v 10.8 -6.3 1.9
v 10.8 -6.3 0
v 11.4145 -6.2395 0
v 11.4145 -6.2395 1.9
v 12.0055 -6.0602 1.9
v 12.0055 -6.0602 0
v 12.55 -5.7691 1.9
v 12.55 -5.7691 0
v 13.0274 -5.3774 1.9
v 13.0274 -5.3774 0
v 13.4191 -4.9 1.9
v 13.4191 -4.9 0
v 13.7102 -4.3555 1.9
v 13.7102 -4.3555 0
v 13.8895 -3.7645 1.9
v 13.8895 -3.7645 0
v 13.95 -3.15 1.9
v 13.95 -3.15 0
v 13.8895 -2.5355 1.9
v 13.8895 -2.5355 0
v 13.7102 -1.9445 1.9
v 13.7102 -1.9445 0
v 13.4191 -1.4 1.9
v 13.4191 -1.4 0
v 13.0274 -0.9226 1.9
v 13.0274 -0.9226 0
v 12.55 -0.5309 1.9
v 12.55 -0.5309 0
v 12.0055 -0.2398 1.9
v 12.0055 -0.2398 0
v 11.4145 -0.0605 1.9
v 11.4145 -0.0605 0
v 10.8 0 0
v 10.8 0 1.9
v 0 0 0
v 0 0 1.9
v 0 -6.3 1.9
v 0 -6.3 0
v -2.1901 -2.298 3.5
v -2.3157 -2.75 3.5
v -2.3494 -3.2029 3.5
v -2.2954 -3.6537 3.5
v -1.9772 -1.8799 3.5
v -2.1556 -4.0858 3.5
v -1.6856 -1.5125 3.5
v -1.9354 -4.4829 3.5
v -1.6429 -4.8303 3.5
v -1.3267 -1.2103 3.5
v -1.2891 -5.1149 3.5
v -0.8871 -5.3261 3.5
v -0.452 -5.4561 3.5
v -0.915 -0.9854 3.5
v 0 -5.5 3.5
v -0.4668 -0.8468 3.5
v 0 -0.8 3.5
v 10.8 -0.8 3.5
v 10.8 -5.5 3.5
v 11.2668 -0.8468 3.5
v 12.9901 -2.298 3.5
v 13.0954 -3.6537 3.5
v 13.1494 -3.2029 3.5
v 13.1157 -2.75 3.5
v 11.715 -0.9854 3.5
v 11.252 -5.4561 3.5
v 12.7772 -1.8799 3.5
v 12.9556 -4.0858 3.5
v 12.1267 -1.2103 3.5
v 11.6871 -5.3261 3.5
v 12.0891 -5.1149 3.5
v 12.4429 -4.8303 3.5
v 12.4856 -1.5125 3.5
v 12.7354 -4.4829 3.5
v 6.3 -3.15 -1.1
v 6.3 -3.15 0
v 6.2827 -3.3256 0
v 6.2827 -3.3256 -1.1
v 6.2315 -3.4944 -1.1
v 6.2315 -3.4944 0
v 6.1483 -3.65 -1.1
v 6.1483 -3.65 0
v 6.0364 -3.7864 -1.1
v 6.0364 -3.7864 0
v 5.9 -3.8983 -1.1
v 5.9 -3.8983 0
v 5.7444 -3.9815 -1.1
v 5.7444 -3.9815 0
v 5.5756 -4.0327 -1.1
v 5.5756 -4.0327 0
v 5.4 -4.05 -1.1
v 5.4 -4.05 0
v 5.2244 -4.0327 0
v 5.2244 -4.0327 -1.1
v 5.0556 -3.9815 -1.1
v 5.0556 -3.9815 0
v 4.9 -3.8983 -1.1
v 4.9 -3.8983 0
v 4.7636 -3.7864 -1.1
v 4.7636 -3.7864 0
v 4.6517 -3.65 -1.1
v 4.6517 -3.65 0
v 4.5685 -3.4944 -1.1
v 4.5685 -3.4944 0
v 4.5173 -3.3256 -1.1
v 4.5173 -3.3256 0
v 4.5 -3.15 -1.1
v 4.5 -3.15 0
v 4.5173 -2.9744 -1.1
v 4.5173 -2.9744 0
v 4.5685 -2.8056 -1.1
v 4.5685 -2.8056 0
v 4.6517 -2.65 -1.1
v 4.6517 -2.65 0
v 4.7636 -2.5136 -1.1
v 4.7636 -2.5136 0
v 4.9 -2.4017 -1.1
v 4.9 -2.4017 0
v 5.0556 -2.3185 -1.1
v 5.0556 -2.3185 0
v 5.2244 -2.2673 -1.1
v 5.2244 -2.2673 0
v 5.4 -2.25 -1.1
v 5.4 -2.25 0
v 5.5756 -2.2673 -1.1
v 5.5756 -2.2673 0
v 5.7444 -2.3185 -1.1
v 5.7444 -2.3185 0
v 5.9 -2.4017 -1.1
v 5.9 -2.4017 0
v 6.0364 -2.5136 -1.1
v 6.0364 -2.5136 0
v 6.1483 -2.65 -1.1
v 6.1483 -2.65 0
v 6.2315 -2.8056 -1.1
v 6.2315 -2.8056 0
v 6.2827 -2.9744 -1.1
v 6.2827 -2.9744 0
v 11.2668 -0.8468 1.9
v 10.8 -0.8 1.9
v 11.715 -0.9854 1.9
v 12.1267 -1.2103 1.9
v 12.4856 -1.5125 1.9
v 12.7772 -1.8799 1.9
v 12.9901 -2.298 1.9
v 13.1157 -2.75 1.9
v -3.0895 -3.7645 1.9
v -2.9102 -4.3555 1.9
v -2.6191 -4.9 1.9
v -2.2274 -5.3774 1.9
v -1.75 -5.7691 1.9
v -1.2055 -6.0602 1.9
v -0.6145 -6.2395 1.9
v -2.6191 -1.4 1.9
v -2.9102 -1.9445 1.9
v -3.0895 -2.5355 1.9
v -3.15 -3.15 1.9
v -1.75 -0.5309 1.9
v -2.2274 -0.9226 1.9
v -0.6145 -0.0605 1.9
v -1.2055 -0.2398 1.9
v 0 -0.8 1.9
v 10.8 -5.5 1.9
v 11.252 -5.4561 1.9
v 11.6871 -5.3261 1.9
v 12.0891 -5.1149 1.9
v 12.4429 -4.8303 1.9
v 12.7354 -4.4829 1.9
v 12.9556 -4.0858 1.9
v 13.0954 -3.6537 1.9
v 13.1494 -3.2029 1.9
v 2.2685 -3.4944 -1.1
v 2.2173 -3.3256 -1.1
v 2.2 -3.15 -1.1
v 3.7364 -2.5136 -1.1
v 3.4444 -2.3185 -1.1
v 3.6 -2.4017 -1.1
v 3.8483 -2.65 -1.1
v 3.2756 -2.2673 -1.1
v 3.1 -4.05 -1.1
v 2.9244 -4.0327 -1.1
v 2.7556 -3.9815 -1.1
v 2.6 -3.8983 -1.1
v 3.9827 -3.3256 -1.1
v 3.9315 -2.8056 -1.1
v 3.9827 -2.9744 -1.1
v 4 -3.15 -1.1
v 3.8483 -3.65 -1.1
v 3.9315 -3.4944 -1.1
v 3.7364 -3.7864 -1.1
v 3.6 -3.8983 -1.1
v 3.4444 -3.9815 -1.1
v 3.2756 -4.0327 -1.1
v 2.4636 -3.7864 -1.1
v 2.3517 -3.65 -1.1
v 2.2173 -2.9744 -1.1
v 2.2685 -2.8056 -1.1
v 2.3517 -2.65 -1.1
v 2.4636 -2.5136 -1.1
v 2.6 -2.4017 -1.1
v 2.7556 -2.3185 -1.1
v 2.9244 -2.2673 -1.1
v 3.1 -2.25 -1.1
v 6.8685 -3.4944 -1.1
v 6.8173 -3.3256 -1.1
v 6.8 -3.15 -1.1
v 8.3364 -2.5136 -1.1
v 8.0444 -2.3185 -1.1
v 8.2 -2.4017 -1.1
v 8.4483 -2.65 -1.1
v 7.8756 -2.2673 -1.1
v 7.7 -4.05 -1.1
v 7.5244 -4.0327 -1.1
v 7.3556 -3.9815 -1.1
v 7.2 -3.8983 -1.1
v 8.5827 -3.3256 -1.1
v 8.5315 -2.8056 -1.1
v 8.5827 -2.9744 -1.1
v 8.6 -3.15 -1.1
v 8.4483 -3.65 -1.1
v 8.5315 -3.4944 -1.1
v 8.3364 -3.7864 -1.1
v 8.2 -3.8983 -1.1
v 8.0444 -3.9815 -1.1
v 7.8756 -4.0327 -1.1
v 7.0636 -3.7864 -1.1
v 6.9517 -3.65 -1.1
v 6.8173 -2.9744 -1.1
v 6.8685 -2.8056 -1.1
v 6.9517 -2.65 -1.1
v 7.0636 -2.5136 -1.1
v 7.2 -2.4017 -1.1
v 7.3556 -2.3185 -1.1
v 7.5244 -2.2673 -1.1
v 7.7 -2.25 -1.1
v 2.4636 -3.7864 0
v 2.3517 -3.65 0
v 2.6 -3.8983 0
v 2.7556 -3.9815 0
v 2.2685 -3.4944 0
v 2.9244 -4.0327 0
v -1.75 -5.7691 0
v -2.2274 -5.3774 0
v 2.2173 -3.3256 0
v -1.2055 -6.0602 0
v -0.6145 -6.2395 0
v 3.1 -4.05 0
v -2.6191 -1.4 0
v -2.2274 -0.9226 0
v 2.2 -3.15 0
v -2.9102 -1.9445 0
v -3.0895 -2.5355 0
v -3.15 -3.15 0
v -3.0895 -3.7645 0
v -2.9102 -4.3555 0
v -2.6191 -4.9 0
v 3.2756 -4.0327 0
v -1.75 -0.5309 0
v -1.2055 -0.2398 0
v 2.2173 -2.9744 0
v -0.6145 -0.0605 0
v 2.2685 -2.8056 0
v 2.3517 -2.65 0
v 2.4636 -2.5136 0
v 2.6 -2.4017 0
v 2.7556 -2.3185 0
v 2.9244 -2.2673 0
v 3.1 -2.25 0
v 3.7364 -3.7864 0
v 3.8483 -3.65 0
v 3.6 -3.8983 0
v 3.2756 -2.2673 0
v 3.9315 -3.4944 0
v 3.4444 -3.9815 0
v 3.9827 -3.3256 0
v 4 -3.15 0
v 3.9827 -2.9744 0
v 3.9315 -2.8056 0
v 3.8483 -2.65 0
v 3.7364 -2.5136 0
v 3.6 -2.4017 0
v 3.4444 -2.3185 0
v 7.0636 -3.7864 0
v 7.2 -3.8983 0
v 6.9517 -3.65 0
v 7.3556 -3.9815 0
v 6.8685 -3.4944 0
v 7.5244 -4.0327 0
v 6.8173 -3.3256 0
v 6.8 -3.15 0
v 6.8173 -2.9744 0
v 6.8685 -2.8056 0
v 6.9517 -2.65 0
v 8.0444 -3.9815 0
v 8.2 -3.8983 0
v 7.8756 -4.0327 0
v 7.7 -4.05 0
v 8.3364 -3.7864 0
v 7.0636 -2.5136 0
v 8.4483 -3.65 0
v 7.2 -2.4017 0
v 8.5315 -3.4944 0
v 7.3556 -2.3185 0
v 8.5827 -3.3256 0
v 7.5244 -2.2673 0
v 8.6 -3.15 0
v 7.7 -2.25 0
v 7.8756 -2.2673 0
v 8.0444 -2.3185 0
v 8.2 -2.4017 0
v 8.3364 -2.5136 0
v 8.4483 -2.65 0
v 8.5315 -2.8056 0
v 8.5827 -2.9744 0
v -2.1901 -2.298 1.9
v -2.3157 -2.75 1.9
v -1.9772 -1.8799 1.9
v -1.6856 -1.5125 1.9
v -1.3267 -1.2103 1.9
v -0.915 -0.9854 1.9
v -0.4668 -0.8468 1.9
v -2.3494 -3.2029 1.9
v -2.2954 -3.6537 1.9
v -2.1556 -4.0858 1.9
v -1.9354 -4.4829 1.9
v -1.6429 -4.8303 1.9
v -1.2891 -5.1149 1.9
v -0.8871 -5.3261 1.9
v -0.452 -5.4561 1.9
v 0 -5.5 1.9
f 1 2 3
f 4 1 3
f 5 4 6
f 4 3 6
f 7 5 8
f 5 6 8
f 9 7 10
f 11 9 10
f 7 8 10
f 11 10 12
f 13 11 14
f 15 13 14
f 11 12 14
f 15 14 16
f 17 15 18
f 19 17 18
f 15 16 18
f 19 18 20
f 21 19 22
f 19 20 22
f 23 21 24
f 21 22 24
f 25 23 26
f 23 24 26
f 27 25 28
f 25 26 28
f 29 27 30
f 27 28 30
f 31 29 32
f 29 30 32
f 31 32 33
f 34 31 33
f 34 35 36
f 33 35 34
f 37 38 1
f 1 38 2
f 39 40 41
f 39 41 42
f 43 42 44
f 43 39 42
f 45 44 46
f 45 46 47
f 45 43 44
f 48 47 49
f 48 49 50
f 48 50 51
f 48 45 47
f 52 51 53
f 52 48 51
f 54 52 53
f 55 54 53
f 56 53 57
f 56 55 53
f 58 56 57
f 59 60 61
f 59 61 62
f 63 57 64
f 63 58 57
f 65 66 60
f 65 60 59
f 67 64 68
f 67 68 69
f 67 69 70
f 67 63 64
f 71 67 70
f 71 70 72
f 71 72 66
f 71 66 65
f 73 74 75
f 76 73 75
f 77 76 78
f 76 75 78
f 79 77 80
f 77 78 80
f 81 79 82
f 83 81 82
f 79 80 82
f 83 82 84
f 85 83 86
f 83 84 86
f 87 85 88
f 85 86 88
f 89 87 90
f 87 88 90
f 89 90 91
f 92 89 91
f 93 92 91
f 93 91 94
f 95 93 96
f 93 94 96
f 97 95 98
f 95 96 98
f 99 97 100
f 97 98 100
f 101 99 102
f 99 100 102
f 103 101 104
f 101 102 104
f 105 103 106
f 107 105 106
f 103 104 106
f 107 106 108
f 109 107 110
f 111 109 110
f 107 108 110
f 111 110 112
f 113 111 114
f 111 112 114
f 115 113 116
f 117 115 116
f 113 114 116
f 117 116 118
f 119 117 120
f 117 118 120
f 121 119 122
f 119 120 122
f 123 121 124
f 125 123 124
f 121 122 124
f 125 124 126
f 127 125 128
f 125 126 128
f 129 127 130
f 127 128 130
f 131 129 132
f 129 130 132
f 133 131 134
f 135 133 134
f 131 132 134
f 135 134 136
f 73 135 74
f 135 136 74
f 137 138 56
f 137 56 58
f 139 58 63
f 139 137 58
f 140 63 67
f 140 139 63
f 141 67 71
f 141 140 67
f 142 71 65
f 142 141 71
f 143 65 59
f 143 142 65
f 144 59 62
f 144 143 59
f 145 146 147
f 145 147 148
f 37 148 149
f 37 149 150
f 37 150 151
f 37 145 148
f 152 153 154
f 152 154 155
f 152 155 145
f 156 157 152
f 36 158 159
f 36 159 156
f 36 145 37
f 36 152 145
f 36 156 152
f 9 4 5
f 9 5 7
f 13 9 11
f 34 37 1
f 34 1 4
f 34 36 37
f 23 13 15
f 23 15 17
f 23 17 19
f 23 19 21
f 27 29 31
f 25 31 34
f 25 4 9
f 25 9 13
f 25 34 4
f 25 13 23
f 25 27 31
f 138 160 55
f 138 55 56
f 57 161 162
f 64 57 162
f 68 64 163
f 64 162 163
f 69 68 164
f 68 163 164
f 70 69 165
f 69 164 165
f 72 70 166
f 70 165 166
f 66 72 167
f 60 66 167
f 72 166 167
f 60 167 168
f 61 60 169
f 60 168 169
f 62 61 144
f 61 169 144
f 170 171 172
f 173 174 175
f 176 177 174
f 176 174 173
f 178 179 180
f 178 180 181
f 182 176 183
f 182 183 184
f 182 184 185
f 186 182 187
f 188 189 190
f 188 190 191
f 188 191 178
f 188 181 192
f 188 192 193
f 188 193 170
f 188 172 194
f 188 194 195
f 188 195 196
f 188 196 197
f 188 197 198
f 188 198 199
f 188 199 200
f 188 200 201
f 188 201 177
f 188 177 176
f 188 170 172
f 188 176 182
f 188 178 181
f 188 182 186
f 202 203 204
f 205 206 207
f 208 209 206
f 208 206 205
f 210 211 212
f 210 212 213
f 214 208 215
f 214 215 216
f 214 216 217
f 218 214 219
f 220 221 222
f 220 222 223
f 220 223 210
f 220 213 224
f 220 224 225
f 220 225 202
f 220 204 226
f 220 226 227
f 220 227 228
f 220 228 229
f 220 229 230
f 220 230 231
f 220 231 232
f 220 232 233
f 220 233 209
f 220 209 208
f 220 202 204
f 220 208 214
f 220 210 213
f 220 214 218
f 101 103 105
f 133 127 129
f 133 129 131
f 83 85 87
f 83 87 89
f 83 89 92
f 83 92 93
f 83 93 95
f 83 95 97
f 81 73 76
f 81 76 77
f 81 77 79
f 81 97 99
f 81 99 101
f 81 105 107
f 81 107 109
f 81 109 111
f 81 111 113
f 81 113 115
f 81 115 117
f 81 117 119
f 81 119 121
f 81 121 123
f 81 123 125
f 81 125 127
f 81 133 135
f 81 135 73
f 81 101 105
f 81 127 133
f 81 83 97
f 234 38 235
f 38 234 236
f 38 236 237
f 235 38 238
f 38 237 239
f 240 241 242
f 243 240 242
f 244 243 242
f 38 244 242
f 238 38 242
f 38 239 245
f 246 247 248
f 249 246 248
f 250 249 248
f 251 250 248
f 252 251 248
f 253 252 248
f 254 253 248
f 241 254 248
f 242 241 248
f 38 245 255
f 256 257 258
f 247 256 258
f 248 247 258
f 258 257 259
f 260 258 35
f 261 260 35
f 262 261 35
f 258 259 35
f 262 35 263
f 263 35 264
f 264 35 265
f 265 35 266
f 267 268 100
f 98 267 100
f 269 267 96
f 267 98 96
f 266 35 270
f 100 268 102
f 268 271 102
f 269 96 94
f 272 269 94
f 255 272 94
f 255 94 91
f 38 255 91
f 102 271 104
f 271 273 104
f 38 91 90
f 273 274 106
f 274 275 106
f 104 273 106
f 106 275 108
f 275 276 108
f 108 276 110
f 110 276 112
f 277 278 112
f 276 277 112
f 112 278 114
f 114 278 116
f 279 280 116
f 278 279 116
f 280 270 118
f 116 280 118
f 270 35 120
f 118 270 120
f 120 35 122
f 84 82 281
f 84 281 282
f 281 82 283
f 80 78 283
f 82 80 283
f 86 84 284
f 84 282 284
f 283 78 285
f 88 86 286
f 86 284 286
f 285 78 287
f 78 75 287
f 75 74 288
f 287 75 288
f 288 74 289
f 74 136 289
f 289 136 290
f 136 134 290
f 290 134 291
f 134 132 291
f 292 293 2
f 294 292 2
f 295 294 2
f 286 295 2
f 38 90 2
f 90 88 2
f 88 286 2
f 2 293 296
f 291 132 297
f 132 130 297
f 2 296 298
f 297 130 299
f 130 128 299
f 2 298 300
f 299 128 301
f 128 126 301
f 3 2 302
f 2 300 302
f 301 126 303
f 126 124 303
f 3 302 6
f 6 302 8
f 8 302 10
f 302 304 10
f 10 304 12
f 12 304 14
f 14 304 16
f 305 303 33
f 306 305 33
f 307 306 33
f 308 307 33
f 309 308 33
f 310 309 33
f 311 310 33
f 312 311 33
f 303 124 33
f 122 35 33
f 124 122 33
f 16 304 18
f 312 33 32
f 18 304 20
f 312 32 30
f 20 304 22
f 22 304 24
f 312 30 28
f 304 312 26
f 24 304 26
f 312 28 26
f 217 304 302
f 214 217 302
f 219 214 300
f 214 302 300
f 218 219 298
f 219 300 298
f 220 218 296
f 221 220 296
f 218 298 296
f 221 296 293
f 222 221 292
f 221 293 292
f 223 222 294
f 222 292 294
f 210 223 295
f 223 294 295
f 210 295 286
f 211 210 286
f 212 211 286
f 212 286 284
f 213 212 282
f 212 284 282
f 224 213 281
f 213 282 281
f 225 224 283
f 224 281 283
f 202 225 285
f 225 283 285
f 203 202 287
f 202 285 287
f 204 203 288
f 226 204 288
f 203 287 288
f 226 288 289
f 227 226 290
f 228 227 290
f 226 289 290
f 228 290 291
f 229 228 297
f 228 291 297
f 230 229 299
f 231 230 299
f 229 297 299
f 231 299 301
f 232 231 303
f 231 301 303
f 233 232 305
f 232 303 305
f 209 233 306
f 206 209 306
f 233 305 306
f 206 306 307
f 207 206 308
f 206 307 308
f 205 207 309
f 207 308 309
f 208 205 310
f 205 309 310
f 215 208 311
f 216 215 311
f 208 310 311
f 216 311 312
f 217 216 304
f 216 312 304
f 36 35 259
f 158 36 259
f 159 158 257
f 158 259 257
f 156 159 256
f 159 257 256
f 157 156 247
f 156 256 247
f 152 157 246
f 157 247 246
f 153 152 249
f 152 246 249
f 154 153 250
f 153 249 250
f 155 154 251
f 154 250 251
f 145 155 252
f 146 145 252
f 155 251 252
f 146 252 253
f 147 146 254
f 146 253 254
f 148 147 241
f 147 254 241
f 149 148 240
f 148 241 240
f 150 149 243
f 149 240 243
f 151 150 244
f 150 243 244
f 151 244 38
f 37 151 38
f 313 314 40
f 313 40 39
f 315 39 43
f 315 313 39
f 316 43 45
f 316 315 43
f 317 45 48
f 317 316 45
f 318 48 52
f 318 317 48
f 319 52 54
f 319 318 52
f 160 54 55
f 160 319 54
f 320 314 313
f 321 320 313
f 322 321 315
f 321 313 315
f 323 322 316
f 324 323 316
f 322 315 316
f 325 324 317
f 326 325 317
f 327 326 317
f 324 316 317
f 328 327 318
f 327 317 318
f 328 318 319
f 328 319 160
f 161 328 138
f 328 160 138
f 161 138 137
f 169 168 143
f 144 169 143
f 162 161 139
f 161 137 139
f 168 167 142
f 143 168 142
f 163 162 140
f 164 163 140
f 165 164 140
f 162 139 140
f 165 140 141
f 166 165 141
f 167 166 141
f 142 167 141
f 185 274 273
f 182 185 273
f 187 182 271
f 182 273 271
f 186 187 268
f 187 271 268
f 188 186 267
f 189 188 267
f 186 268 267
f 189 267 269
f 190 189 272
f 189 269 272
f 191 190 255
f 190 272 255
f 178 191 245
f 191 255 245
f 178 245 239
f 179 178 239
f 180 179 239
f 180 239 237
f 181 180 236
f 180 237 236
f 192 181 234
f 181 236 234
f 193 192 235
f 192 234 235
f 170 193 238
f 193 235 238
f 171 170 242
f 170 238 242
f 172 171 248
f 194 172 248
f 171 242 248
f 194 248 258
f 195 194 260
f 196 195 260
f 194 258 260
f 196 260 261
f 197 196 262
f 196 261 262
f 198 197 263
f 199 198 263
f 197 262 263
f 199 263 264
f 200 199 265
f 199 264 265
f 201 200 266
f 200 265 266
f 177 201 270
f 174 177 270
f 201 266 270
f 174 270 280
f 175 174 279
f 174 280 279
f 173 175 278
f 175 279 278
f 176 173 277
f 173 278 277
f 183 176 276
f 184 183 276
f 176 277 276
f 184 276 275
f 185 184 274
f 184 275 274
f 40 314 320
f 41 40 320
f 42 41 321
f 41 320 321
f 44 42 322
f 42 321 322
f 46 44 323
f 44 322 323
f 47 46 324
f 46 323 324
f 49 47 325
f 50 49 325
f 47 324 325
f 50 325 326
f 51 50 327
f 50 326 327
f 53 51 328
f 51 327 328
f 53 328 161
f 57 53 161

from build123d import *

# Parameters (mm, degrees)
SKETCH_1_R          = 3.15
SKETCH_1_W          = 10.8
SKETCH_1_H          = 6.3
EXTRUDE_1_DEPTH     = 1.9
EXTRUDE_4_DEPTH     = 1.6
MOVE_START          = 1.9
MOVE_BODY_1_DEPTH   = 1.6
MOVE_BODY_1_2_DEPTH = 1.6
SKETCH_6_R          = 0.9
EXTRUDE_5_DEPTH     = 1.1


# Read off the part's stored shape, not the designer's step: Тело-Переместить/Копировать1
with BuildPart() as part:
    # Эскиз1 → Бобышка-Вытянуть1 (new body)
    with BuildSketch(Plane.XY):
        with Locations((0, -3.15)):
            Circle(SKETCH_1_R)
        with Locations((10.8, -3.15)):
            Circle(SKETCH_1_R)
        with Locations((5.4, -3.15)):
            Rectangle(SKETCH_1_W, SKETCH_1_H)
    extrude(amount=EXTRUDE_1_DEPTH)

    # Эскиз6 → Бобышка-Вытянуть5 (add)
    with BuildSketch(Plane(origin=(0, 0, 0), x_dir=(-1, 0, 0), z_dir=(0, 0, -1))):
        with Locations(Location((-5.4, -3.15, 0), (0, 0, 180))):
            Circle(SKETCH_6_R)
        with Locations(Location((-7.7, -3.15, 0), (0, 0, 180))):
            Circle(SKETCH_6_R)
        with Locations(Location((-3.1, -3.15, 0), (0, 0, 180))):
            Circle(SKETCH_6_R)
    extrude(amount=EXTRUDE_5_DEPTH)


with BuildPart() as body_2:
    # Эскиз4 → Бобышка-Вытянуть4 (new body)
    with BuildSketch(Plane.XY.offset(1.9)):
        with BuildLine():
            ThreePointArc((0, 0), (-2.35, -2.35), (0, -4.7))
            Line((0, -4.7), (0, 0))
        make_face()
        with BuildLine():
            Line((0, 0), (0, -4.7))
            ThreePointArc((0, -4.7), (1.661700936, -4.011700936), (2.35, -2.35))
            ThreePointArc((2.35, -2.35), (1.661700936, -0.688299064), (0, 0))
        make_face()
        with BuildLine():
            ThreePointArc((2.35, -2.35), (1.661700936, -4.011700936), (0, -4.7))
            Line((0, -4.7), (10.8, -4.7))
            ThreePointArc((10.8, -4.7), (8.45, -2.35), (10.8, 0))
            Line((10.8, 0), (0, 0))
            ThreePointArc((0, 0), (1.661700936, -0.688299064), (2.35, -2.35))
        make_face()
        with BuildLine():
            ThreePointArc((10.8, 0), (8.45, -2.35), (10.8, -4.7))
            Line((10.8, -4.7), (10.8, 0))
        make_face()
        with BuildLine():
            Line((10.8, 0), (10.8, -4.7))
            ThreePointArc((10.8, -4.7), (12.461700936, -4.011700936), (13.15, -2.35))
            ThreePointArc((13.15, -2.35), (12.461700936, -0.688299064), (10.8, 0))
        make_face()
    extrude(amount=EXTRUDE_4_DEPTH)

    # Move Body 1 outline → Move Body 1 (cut)
    with BuildSketch(Plane.XY.offset(MOVE_START)):
        with BuildLine():
            ThreePointArc((0, 0), (-1.797567801, -0.83631245), (-2.315707235, -2.75))
            ThreePointArc((-2.315707235, -2.75), (-1.51368755, -1.352432199), (0, -0.8))
            Line((0, -0.8), (10.8, -0.8))
            ThreePointArc((10.8, -0.8), (12.31368755, -1.352432199), (13.115707235, -2.75))
            ThreePointArc((13.115707235, -2.75), (12.597567801, -0.83631245), (10.8, 0))
            Line((10.8, 0), (0, 0))
        make_face()
    extrude(amount=MOVE_BODY_1_DEPTH, mode=Mode.SUBTRACT)

    # Move Body 1 2 outline → Move Body 1 2 (add)
    with BuildSketch(Plane.XY.offset(MOVE_START)):
        with BuildLine():
            ThreePointArc((-2.315707235, -2.75), (-1.797567801, -4.66368755), (0, -5.5))
            Line((0, -5.5), (10.8, -5.5))
            ThreePointArc((10.8, -5.5), (12.597567801, -4.66368755), (13.115707235, -2.75))
            ThreePointArc((13.115707235, -2.75), (12.31368755, -4.147567801), (10.8, -4.7))
            Line((10.8, -4.7), (0, -4.7))
            ThreePointArc((0, -4.7), (-1.51368755, -4.147567801), (-2.315707235, -2.75))
        make_face()
    extrude(amount=MOVE_BODY_1_2_DEPTH)


solid = Compound([part.part, body_2.part])
